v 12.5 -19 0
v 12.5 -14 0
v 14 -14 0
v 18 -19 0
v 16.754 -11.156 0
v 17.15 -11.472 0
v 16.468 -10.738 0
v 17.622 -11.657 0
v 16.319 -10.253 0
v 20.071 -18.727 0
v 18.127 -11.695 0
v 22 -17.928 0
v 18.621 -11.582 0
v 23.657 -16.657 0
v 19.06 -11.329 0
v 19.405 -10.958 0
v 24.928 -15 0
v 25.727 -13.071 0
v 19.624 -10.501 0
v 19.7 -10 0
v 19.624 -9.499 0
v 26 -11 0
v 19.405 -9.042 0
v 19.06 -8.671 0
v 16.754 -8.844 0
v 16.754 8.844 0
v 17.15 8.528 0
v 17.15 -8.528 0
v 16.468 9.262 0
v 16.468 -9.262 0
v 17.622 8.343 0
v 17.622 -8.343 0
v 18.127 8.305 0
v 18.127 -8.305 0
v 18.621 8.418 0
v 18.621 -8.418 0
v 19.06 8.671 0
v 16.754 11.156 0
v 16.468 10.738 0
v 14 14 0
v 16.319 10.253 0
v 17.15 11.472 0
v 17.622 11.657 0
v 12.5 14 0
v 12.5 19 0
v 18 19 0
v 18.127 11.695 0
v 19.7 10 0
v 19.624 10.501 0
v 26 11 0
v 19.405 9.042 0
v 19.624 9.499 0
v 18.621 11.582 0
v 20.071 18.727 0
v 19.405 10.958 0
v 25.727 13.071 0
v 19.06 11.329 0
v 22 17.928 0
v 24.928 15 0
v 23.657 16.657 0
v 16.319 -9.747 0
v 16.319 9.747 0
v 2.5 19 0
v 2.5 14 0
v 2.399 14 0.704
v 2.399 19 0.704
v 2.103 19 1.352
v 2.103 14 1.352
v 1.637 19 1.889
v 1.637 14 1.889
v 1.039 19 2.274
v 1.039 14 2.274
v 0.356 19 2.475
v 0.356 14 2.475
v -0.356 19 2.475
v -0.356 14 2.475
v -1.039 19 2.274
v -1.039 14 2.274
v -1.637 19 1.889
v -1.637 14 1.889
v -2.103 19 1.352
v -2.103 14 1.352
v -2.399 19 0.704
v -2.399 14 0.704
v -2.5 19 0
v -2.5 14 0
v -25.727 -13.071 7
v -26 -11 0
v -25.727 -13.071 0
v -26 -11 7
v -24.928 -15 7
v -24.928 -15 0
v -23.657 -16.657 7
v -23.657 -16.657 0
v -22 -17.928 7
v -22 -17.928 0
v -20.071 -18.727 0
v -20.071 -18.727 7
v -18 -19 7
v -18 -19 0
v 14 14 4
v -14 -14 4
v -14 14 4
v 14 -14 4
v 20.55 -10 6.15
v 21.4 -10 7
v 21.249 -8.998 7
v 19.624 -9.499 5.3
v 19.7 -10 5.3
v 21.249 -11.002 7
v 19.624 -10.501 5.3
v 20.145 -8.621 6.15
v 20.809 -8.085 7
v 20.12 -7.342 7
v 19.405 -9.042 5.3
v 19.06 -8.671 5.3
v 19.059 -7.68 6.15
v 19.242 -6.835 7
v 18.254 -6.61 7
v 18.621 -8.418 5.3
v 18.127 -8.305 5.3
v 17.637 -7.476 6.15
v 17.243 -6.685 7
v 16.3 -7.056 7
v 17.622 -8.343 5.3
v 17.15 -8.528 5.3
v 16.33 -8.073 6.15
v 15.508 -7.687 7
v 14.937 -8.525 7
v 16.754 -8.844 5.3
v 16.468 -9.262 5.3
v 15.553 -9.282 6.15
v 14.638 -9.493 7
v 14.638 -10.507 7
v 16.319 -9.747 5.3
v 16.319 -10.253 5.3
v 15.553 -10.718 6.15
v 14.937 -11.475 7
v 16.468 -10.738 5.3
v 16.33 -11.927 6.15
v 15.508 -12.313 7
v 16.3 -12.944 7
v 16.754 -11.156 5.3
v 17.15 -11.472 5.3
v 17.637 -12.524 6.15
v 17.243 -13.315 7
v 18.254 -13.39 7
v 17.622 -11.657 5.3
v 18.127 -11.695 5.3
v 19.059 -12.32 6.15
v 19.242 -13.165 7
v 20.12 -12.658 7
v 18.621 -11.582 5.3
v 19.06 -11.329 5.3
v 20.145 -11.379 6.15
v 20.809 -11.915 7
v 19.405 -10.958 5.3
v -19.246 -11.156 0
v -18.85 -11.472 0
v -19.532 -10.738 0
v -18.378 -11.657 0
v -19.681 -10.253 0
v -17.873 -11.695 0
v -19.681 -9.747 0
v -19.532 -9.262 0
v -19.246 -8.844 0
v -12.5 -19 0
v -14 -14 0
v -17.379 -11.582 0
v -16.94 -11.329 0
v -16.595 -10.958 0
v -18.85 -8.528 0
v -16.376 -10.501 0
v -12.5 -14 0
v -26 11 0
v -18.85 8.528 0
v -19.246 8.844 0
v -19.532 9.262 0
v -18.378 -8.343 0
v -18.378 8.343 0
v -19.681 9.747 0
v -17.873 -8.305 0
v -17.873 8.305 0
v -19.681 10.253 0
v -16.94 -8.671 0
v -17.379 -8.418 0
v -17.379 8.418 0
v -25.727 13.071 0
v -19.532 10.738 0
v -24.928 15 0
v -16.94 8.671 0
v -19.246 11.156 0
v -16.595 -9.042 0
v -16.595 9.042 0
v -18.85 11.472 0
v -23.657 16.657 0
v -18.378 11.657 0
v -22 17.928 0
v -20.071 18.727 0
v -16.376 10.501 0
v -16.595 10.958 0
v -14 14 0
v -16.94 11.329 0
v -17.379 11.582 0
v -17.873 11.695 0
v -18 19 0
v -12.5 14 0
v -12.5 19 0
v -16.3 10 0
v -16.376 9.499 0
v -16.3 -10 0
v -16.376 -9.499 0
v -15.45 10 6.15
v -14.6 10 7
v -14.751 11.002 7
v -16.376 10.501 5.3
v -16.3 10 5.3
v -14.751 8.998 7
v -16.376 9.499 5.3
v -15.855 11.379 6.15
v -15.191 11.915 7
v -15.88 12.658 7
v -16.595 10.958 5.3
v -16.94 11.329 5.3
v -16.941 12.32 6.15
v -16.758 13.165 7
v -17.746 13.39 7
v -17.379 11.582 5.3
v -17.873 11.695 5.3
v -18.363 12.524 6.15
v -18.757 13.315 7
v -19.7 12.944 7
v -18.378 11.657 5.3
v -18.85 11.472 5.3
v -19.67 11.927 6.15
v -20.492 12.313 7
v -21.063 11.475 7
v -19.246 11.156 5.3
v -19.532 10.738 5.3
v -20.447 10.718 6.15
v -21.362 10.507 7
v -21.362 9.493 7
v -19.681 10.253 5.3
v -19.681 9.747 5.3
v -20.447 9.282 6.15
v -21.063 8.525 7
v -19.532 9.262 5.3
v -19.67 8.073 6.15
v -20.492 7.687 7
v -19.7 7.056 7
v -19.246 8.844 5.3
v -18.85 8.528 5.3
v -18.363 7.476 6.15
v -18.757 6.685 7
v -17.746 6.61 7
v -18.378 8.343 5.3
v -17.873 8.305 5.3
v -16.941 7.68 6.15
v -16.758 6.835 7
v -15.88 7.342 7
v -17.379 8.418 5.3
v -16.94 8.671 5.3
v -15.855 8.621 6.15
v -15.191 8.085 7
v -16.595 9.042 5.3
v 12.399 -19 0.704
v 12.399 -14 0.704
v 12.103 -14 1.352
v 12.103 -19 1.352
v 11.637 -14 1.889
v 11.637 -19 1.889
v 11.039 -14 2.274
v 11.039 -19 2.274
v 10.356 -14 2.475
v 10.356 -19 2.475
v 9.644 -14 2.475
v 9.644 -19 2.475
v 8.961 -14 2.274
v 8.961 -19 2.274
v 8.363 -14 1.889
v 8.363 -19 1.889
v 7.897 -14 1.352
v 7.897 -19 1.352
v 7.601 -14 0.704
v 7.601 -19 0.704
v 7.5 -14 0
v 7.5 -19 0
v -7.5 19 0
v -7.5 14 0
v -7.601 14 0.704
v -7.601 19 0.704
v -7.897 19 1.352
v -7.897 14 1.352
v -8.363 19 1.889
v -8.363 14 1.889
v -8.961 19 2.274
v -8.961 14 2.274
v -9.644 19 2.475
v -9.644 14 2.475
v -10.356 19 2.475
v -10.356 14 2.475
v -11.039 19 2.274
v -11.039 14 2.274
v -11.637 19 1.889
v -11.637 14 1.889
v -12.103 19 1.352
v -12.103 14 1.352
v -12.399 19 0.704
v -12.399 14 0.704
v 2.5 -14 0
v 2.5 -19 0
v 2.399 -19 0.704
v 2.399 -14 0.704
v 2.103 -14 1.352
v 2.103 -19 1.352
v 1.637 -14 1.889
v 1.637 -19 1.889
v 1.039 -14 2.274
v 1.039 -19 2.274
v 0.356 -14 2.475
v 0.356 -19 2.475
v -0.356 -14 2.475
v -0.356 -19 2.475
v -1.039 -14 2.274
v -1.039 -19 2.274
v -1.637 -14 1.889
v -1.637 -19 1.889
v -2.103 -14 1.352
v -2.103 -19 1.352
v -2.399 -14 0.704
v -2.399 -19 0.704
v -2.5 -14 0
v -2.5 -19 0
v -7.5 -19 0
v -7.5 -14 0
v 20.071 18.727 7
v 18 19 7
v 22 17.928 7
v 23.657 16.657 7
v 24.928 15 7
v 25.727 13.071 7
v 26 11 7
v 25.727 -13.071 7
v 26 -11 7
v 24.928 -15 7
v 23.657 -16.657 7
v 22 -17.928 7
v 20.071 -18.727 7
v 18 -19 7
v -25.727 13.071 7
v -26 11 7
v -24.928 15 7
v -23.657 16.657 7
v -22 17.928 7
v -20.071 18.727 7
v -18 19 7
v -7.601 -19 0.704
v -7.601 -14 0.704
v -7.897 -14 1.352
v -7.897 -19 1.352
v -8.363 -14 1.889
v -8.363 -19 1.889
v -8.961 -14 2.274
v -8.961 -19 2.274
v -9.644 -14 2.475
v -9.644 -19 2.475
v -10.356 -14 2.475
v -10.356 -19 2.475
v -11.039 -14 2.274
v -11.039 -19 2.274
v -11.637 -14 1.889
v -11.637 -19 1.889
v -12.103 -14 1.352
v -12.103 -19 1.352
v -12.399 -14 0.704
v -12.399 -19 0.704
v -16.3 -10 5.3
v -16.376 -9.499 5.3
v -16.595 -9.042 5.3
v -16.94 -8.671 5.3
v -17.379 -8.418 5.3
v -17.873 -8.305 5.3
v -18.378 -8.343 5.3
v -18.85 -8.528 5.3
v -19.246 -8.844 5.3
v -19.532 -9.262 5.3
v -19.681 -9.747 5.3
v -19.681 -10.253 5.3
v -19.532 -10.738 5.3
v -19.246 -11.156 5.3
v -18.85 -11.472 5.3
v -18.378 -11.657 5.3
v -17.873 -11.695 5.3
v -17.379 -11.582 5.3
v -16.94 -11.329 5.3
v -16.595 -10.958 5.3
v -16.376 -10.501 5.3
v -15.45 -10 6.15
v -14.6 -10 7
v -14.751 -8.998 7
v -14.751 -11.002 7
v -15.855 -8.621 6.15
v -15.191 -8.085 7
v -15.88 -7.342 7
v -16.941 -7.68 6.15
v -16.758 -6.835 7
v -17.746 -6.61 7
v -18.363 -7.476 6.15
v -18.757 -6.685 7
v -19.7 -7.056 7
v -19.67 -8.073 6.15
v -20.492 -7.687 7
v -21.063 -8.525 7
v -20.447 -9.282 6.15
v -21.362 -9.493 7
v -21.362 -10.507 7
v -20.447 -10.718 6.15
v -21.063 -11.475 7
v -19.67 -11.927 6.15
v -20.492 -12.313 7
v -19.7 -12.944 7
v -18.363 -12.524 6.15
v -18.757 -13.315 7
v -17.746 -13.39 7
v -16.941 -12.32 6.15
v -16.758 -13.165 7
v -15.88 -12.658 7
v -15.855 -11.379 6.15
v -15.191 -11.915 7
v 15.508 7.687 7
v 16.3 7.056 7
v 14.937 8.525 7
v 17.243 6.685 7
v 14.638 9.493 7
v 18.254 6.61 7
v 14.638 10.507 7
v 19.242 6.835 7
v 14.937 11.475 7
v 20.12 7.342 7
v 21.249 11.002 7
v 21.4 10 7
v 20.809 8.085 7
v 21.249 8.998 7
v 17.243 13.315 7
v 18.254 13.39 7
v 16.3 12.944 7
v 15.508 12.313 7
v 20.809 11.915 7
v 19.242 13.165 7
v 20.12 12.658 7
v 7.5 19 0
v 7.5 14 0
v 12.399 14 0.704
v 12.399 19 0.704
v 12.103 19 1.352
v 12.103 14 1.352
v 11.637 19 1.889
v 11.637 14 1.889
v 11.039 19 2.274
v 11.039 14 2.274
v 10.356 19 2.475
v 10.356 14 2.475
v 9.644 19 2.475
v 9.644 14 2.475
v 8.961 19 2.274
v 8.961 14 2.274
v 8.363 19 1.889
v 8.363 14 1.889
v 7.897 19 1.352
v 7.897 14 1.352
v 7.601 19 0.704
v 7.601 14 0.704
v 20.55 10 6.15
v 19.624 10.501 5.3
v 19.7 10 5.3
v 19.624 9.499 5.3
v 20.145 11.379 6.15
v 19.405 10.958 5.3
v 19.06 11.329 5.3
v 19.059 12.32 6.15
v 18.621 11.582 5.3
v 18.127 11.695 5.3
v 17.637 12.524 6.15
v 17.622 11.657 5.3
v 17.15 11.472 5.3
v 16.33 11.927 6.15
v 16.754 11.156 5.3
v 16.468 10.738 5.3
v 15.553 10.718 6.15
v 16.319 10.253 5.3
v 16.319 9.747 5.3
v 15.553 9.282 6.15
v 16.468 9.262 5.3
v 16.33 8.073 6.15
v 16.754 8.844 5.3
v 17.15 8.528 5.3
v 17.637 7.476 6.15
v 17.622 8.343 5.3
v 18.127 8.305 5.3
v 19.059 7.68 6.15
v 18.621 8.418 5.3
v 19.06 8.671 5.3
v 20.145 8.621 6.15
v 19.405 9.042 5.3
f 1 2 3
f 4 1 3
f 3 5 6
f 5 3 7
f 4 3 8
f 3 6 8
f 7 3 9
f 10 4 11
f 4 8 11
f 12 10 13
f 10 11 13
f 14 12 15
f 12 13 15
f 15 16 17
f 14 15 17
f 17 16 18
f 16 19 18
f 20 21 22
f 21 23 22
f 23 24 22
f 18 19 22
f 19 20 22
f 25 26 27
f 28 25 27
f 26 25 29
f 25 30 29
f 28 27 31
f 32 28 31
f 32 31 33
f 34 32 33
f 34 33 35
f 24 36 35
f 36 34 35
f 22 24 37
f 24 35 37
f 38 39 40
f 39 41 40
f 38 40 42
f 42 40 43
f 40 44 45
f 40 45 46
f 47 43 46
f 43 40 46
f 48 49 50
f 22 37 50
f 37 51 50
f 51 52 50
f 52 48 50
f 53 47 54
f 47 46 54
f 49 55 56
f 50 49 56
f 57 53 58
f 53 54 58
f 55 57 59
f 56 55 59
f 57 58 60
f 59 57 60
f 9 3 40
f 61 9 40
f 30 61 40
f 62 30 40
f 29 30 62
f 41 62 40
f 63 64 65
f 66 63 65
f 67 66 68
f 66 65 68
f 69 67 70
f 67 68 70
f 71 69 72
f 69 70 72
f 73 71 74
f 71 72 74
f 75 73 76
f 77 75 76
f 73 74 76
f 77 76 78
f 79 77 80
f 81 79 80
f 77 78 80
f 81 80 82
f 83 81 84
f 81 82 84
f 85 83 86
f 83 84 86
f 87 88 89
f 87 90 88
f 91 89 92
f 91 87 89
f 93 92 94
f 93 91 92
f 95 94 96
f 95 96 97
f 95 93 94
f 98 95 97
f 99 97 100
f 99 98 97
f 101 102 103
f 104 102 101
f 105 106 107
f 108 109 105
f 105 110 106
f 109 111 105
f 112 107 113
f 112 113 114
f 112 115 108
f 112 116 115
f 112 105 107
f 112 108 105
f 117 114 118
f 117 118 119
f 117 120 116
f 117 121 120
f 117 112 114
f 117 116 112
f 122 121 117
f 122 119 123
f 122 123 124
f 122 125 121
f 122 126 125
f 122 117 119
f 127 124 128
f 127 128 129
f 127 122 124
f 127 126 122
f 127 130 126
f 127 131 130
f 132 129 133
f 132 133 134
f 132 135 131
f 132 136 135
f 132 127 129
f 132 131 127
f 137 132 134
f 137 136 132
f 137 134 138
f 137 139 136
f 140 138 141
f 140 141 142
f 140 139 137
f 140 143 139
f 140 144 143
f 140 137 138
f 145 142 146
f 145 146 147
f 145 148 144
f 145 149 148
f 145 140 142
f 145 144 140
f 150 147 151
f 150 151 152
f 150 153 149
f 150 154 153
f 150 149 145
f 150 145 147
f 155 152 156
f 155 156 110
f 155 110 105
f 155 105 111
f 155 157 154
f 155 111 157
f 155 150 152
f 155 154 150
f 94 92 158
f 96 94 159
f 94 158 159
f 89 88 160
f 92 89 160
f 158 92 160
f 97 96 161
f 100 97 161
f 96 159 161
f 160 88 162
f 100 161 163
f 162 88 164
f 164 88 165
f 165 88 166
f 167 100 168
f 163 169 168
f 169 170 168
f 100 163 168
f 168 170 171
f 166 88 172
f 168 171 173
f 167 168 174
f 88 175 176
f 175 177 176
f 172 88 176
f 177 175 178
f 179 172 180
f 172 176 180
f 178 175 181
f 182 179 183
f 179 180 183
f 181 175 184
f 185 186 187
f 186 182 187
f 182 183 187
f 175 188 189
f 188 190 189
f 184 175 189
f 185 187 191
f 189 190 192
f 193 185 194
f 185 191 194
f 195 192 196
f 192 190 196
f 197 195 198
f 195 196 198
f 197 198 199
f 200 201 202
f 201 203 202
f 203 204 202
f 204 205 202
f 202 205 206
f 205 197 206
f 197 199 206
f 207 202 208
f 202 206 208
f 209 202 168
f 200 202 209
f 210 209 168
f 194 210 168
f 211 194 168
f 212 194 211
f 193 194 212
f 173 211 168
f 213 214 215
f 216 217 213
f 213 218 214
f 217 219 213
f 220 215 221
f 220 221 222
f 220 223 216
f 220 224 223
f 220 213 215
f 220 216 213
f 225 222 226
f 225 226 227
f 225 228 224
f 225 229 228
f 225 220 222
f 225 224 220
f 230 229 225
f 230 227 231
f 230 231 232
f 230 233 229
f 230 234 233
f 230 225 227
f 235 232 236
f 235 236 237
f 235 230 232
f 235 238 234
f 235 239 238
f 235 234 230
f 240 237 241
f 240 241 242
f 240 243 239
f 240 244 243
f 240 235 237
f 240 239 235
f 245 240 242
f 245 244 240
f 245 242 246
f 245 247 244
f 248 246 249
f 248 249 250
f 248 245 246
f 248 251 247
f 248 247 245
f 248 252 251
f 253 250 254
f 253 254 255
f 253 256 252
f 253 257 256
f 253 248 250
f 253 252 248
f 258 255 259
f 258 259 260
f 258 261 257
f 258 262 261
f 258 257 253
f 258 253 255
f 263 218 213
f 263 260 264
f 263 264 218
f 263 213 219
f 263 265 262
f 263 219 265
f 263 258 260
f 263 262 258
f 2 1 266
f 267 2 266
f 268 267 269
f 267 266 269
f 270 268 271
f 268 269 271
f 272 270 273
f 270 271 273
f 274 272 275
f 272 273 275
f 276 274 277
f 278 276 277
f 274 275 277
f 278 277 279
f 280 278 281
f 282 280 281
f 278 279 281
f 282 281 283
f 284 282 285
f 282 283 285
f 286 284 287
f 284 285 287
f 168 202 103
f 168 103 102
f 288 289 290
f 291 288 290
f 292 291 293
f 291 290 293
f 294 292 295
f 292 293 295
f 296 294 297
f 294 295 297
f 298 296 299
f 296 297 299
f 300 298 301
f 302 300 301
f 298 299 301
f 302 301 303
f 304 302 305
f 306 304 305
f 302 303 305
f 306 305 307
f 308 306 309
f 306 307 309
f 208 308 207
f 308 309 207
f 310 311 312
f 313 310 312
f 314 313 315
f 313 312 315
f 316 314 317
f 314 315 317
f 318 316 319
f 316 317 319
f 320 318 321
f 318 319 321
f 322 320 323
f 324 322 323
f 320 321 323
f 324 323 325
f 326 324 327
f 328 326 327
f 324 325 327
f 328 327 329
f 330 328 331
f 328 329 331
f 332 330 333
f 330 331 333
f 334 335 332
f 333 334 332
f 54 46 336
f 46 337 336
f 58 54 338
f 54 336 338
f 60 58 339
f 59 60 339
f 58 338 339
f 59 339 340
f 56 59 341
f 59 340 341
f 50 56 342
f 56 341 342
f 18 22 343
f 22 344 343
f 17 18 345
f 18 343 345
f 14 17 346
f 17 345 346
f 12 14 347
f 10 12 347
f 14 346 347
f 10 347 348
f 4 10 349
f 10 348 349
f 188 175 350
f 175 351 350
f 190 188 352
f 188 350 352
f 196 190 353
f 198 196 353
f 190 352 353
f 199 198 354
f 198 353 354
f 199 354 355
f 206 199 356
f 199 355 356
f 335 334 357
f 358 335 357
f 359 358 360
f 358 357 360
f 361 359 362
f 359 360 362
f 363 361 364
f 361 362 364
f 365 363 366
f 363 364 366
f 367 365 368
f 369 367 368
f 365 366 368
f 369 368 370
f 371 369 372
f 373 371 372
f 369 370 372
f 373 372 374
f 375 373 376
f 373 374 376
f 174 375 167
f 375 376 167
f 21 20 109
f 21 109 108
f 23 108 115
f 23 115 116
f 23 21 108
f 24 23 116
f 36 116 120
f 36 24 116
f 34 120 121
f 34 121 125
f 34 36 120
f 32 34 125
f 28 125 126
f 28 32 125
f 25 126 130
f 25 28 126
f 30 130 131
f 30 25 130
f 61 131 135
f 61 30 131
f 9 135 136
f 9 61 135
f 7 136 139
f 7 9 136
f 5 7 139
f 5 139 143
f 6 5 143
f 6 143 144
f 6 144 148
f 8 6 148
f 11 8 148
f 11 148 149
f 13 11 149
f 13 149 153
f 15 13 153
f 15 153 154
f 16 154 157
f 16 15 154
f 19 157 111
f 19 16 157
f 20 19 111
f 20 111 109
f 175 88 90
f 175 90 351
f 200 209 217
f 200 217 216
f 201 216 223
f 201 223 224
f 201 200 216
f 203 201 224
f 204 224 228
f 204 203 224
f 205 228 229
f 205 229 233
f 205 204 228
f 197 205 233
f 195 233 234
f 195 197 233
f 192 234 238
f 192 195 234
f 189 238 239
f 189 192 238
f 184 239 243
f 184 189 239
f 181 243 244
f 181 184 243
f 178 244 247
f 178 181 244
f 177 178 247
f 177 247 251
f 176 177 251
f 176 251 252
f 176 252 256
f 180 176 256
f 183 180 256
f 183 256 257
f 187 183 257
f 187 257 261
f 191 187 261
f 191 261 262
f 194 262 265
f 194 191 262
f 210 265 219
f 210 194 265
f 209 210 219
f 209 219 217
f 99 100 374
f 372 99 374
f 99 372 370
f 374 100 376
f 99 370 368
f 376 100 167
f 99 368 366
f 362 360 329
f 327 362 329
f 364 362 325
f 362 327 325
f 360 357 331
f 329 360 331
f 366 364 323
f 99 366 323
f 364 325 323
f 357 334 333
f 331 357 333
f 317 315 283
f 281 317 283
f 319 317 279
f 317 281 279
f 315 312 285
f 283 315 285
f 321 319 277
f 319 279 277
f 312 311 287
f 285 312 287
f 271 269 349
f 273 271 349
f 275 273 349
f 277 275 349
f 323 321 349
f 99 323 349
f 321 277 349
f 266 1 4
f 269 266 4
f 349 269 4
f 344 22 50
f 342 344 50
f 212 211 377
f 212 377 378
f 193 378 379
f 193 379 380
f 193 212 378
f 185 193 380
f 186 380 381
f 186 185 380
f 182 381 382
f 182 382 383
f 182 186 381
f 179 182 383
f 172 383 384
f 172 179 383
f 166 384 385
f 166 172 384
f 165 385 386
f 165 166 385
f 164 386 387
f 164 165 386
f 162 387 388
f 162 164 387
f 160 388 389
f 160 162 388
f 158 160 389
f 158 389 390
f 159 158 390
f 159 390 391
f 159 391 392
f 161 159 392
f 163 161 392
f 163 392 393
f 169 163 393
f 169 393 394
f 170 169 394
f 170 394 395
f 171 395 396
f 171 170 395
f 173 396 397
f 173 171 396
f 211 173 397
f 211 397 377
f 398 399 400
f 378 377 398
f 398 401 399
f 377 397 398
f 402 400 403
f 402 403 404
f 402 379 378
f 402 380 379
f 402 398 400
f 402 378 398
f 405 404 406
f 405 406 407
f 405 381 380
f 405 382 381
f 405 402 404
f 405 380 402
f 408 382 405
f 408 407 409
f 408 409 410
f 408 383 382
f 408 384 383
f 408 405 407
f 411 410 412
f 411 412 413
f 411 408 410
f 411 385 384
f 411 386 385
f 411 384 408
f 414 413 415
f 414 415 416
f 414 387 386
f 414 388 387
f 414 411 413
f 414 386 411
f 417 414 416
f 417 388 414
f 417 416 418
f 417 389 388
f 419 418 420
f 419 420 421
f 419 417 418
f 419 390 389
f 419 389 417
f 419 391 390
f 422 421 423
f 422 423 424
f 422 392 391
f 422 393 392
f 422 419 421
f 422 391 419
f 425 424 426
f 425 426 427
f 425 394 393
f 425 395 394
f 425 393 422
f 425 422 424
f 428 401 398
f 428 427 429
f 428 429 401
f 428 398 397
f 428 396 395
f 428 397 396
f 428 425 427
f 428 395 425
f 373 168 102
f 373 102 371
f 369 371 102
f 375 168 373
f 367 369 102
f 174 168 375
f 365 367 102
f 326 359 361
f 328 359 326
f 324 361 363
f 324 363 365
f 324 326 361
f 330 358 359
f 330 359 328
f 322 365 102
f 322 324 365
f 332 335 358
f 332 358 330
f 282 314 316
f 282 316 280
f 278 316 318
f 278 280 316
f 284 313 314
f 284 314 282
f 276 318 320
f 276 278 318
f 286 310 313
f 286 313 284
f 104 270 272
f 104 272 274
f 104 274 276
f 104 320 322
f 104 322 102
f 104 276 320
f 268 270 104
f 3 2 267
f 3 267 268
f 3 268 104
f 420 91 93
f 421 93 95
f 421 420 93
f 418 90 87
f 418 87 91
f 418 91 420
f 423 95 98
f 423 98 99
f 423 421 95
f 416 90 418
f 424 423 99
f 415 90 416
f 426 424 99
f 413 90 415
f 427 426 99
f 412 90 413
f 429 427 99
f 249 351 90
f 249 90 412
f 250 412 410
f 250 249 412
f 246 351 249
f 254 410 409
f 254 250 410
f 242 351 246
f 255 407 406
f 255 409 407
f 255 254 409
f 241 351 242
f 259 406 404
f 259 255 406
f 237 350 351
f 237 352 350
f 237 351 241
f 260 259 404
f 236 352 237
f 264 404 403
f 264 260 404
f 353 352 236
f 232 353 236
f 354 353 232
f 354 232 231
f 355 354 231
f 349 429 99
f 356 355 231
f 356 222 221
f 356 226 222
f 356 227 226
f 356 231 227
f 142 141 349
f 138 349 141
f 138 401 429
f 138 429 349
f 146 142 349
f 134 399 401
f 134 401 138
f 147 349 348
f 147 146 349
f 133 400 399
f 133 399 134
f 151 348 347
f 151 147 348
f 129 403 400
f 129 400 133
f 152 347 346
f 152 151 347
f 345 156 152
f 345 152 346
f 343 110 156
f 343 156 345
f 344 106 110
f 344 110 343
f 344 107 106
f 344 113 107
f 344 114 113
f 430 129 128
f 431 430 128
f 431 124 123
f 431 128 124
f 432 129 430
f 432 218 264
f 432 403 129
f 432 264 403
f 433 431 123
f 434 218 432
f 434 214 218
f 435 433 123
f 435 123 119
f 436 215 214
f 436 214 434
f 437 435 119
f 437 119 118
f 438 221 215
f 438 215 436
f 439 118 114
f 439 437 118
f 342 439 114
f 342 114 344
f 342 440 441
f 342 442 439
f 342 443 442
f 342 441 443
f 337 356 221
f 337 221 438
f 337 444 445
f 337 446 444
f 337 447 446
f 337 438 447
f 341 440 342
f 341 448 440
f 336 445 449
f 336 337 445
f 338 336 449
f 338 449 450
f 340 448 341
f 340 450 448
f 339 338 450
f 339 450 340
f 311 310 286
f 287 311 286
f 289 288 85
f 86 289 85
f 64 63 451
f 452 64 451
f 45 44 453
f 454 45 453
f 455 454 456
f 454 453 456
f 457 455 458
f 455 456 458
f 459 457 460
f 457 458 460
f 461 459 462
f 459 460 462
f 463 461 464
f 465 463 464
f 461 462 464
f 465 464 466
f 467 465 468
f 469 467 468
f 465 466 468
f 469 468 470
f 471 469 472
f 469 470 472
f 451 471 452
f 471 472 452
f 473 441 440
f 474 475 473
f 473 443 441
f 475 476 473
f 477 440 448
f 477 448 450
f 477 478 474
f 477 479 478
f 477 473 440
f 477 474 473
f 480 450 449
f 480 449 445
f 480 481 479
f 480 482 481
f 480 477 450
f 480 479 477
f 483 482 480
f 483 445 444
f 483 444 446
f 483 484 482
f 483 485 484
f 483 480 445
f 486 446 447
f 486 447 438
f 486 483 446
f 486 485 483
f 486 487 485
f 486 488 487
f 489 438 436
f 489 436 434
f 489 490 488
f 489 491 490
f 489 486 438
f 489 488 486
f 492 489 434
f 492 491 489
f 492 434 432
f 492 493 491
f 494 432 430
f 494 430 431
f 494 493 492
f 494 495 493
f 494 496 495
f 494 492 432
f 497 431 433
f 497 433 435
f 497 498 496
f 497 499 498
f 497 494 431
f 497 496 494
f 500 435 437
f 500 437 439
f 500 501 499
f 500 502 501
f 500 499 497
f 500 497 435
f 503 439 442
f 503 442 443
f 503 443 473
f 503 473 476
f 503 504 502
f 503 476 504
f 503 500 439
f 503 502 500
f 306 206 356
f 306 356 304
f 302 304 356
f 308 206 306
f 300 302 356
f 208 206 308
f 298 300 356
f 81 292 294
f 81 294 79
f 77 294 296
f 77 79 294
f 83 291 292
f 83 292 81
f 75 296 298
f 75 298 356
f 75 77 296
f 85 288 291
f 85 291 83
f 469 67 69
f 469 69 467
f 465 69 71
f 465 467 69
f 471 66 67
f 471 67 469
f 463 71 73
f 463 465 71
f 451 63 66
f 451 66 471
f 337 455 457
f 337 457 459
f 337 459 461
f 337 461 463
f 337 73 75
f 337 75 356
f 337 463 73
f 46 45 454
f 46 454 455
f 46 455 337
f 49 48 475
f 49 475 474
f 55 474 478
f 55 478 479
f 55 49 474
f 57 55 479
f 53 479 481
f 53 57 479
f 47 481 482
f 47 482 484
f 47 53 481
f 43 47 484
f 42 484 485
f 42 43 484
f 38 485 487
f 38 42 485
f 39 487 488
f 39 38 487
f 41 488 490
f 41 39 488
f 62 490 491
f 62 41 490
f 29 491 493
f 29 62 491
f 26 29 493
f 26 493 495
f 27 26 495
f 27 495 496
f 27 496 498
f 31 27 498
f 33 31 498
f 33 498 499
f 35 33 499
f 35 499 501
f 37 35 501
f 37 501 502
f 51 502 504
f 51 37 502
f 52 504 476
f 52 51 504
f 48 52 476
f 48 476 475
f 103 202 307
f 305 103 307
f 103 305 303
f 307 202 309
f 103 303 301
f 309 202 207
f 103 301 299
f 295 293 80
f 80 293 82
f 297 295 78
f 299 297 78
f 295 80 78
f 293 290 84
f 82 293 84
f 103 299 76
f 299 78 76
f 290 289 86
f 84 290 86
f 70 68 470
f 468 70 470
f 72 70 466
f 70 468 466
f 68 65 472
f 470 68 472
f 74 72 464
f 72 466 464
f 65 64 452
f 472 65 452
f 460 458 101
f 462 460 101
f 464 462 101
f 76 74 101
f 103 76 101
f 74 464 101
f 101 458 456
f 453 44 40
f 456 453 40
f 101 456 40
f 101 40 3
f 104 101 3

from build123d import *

# Parameters (mm, degrees)
SKETCH_W        = 52
SKETCH_H        = 38
SKETCH_R        = 1.7
PAD_DEPTH       = 7
SKETCH001_R     = 2.5
POCKET_DEPTH    = 38.001
SKETCH002_W     = 28
SKETCH002_H     = 28
POCKET001_DEPTH = 4
FILLET_R        = 8
FILLET001_R     = 8
FILLET002_R     = 8
FILLET003_R     = 8
CHAMFER_SIZE    = 1.7
CHAMFER001_SIZE = 1.7
CHAMFER002_SIZE = 1.7
CHAMFER003_SIZE = 1.7


with BuildPart() as part:
    # Sketch → Pad (new body)
    with BuildSketch(Plane.XY):
        Rectangle(SKETCH_W, SKETCH_H)
        with Locations((-18, 10)):
            Circle(SKETCH_R, mode=Mode.SUBTRACT)
        with Locations((18, 10)):
            Circle(SKETCH_R, mode=Mode.SUBTRACT)
        with Locations((-18, -10)):
            Circle(SKETCH_R, mode=Mode.SUBTRACT)
        with Locations((18, -10)):
            Circle(SKETCH_R, mode=Mode.SUBTRACT)
    extrude(amount=PAD_DEPTH)

    # Sketch001 → Pocket (cut, through all)
    with BuildSketch(Plane.XZ.offset(19)):
        with Locations((-10, 0)):
            Circle(SKETCH001_R)
        Circle(SKETCH001_R)
        with Locations((10, 0)):
            Circle(SKETCH001_R)
    extrude(amount=-POCKET_DEPTH, mode=Mode.SUBTRACT)

    # Sketch002 → Pocket001 (cut)
    with BuildSketch(Plane(origin=(0, 0, 0), x_dir=(1, 0, 0), z_dir=(0, 0, -1))):
        Rectangle(SKETCH002_W, SKETCH002_H)
    extrude(amount=-POCKET001_DEPTH, mode=Mode.SUBTRACT)

    # Fillet
    fillet_edges = [part.edges().sort_by_distance(p)[0] for p in [
        (-26, -19, 3.5),
    ]]
    fillet(fillet_edges, radius=FILLET_R)

    # Fillet001
    fillet001_edges = [part.edges().sort_by_distance(p)[0] for p in [
        (-26, 19, 3.5),
    ]]
    fillet(fillet001_edges, radius=FILLET001_R)

    # Fillet002
    fillet002_edges = [part.edges().sort_by_distance(p)[0] for p in [
        (26, 19, 3.5),
    ]]
    fillet(fillet002_edges, radius=FILLET002_R)

    # Fillet003
    fillet003_edges = [part.edges().sort_by_distance(p)[0] for p in [
        (26, -19, 3.5),
    ]]
    fillet(fillet003_edges, radius=FILLET003_R)

    # Chamfer
    chamfer_edges = [part.edges().sort_by_distance(p)[0] for p in [
        (16.3, -10, 7),
    ]]
    chamfer(chamfer_edges, length=CHAMFER_SIZE)

    # Chamfer001
    chamfer001_edges = [part.edges().sort_by_distance(p)[0] for p in [
        (16.3, 10, 7),
    ]]
    chamfer(chamfer001_edges, length=CHAMFER001_SIZE)

    # Chamfer002
    chamfer002_edges = [part.edges().sort_by_distance(p)[0] for p in [
        (-19.7, 10, 7),
    ]]
    chamfer(chamfer002_edges, length=CHAMFER002_SIZE)

    # Chamfer003
    chamfer003_edges = [part.edges().sort_by_distance(p)[0] for p in [
        (-19.7, -10, 7),
    ]]
    chamfer(chamfer003_edges, length=CHAMFER003_SIZE)


solid = part.part
